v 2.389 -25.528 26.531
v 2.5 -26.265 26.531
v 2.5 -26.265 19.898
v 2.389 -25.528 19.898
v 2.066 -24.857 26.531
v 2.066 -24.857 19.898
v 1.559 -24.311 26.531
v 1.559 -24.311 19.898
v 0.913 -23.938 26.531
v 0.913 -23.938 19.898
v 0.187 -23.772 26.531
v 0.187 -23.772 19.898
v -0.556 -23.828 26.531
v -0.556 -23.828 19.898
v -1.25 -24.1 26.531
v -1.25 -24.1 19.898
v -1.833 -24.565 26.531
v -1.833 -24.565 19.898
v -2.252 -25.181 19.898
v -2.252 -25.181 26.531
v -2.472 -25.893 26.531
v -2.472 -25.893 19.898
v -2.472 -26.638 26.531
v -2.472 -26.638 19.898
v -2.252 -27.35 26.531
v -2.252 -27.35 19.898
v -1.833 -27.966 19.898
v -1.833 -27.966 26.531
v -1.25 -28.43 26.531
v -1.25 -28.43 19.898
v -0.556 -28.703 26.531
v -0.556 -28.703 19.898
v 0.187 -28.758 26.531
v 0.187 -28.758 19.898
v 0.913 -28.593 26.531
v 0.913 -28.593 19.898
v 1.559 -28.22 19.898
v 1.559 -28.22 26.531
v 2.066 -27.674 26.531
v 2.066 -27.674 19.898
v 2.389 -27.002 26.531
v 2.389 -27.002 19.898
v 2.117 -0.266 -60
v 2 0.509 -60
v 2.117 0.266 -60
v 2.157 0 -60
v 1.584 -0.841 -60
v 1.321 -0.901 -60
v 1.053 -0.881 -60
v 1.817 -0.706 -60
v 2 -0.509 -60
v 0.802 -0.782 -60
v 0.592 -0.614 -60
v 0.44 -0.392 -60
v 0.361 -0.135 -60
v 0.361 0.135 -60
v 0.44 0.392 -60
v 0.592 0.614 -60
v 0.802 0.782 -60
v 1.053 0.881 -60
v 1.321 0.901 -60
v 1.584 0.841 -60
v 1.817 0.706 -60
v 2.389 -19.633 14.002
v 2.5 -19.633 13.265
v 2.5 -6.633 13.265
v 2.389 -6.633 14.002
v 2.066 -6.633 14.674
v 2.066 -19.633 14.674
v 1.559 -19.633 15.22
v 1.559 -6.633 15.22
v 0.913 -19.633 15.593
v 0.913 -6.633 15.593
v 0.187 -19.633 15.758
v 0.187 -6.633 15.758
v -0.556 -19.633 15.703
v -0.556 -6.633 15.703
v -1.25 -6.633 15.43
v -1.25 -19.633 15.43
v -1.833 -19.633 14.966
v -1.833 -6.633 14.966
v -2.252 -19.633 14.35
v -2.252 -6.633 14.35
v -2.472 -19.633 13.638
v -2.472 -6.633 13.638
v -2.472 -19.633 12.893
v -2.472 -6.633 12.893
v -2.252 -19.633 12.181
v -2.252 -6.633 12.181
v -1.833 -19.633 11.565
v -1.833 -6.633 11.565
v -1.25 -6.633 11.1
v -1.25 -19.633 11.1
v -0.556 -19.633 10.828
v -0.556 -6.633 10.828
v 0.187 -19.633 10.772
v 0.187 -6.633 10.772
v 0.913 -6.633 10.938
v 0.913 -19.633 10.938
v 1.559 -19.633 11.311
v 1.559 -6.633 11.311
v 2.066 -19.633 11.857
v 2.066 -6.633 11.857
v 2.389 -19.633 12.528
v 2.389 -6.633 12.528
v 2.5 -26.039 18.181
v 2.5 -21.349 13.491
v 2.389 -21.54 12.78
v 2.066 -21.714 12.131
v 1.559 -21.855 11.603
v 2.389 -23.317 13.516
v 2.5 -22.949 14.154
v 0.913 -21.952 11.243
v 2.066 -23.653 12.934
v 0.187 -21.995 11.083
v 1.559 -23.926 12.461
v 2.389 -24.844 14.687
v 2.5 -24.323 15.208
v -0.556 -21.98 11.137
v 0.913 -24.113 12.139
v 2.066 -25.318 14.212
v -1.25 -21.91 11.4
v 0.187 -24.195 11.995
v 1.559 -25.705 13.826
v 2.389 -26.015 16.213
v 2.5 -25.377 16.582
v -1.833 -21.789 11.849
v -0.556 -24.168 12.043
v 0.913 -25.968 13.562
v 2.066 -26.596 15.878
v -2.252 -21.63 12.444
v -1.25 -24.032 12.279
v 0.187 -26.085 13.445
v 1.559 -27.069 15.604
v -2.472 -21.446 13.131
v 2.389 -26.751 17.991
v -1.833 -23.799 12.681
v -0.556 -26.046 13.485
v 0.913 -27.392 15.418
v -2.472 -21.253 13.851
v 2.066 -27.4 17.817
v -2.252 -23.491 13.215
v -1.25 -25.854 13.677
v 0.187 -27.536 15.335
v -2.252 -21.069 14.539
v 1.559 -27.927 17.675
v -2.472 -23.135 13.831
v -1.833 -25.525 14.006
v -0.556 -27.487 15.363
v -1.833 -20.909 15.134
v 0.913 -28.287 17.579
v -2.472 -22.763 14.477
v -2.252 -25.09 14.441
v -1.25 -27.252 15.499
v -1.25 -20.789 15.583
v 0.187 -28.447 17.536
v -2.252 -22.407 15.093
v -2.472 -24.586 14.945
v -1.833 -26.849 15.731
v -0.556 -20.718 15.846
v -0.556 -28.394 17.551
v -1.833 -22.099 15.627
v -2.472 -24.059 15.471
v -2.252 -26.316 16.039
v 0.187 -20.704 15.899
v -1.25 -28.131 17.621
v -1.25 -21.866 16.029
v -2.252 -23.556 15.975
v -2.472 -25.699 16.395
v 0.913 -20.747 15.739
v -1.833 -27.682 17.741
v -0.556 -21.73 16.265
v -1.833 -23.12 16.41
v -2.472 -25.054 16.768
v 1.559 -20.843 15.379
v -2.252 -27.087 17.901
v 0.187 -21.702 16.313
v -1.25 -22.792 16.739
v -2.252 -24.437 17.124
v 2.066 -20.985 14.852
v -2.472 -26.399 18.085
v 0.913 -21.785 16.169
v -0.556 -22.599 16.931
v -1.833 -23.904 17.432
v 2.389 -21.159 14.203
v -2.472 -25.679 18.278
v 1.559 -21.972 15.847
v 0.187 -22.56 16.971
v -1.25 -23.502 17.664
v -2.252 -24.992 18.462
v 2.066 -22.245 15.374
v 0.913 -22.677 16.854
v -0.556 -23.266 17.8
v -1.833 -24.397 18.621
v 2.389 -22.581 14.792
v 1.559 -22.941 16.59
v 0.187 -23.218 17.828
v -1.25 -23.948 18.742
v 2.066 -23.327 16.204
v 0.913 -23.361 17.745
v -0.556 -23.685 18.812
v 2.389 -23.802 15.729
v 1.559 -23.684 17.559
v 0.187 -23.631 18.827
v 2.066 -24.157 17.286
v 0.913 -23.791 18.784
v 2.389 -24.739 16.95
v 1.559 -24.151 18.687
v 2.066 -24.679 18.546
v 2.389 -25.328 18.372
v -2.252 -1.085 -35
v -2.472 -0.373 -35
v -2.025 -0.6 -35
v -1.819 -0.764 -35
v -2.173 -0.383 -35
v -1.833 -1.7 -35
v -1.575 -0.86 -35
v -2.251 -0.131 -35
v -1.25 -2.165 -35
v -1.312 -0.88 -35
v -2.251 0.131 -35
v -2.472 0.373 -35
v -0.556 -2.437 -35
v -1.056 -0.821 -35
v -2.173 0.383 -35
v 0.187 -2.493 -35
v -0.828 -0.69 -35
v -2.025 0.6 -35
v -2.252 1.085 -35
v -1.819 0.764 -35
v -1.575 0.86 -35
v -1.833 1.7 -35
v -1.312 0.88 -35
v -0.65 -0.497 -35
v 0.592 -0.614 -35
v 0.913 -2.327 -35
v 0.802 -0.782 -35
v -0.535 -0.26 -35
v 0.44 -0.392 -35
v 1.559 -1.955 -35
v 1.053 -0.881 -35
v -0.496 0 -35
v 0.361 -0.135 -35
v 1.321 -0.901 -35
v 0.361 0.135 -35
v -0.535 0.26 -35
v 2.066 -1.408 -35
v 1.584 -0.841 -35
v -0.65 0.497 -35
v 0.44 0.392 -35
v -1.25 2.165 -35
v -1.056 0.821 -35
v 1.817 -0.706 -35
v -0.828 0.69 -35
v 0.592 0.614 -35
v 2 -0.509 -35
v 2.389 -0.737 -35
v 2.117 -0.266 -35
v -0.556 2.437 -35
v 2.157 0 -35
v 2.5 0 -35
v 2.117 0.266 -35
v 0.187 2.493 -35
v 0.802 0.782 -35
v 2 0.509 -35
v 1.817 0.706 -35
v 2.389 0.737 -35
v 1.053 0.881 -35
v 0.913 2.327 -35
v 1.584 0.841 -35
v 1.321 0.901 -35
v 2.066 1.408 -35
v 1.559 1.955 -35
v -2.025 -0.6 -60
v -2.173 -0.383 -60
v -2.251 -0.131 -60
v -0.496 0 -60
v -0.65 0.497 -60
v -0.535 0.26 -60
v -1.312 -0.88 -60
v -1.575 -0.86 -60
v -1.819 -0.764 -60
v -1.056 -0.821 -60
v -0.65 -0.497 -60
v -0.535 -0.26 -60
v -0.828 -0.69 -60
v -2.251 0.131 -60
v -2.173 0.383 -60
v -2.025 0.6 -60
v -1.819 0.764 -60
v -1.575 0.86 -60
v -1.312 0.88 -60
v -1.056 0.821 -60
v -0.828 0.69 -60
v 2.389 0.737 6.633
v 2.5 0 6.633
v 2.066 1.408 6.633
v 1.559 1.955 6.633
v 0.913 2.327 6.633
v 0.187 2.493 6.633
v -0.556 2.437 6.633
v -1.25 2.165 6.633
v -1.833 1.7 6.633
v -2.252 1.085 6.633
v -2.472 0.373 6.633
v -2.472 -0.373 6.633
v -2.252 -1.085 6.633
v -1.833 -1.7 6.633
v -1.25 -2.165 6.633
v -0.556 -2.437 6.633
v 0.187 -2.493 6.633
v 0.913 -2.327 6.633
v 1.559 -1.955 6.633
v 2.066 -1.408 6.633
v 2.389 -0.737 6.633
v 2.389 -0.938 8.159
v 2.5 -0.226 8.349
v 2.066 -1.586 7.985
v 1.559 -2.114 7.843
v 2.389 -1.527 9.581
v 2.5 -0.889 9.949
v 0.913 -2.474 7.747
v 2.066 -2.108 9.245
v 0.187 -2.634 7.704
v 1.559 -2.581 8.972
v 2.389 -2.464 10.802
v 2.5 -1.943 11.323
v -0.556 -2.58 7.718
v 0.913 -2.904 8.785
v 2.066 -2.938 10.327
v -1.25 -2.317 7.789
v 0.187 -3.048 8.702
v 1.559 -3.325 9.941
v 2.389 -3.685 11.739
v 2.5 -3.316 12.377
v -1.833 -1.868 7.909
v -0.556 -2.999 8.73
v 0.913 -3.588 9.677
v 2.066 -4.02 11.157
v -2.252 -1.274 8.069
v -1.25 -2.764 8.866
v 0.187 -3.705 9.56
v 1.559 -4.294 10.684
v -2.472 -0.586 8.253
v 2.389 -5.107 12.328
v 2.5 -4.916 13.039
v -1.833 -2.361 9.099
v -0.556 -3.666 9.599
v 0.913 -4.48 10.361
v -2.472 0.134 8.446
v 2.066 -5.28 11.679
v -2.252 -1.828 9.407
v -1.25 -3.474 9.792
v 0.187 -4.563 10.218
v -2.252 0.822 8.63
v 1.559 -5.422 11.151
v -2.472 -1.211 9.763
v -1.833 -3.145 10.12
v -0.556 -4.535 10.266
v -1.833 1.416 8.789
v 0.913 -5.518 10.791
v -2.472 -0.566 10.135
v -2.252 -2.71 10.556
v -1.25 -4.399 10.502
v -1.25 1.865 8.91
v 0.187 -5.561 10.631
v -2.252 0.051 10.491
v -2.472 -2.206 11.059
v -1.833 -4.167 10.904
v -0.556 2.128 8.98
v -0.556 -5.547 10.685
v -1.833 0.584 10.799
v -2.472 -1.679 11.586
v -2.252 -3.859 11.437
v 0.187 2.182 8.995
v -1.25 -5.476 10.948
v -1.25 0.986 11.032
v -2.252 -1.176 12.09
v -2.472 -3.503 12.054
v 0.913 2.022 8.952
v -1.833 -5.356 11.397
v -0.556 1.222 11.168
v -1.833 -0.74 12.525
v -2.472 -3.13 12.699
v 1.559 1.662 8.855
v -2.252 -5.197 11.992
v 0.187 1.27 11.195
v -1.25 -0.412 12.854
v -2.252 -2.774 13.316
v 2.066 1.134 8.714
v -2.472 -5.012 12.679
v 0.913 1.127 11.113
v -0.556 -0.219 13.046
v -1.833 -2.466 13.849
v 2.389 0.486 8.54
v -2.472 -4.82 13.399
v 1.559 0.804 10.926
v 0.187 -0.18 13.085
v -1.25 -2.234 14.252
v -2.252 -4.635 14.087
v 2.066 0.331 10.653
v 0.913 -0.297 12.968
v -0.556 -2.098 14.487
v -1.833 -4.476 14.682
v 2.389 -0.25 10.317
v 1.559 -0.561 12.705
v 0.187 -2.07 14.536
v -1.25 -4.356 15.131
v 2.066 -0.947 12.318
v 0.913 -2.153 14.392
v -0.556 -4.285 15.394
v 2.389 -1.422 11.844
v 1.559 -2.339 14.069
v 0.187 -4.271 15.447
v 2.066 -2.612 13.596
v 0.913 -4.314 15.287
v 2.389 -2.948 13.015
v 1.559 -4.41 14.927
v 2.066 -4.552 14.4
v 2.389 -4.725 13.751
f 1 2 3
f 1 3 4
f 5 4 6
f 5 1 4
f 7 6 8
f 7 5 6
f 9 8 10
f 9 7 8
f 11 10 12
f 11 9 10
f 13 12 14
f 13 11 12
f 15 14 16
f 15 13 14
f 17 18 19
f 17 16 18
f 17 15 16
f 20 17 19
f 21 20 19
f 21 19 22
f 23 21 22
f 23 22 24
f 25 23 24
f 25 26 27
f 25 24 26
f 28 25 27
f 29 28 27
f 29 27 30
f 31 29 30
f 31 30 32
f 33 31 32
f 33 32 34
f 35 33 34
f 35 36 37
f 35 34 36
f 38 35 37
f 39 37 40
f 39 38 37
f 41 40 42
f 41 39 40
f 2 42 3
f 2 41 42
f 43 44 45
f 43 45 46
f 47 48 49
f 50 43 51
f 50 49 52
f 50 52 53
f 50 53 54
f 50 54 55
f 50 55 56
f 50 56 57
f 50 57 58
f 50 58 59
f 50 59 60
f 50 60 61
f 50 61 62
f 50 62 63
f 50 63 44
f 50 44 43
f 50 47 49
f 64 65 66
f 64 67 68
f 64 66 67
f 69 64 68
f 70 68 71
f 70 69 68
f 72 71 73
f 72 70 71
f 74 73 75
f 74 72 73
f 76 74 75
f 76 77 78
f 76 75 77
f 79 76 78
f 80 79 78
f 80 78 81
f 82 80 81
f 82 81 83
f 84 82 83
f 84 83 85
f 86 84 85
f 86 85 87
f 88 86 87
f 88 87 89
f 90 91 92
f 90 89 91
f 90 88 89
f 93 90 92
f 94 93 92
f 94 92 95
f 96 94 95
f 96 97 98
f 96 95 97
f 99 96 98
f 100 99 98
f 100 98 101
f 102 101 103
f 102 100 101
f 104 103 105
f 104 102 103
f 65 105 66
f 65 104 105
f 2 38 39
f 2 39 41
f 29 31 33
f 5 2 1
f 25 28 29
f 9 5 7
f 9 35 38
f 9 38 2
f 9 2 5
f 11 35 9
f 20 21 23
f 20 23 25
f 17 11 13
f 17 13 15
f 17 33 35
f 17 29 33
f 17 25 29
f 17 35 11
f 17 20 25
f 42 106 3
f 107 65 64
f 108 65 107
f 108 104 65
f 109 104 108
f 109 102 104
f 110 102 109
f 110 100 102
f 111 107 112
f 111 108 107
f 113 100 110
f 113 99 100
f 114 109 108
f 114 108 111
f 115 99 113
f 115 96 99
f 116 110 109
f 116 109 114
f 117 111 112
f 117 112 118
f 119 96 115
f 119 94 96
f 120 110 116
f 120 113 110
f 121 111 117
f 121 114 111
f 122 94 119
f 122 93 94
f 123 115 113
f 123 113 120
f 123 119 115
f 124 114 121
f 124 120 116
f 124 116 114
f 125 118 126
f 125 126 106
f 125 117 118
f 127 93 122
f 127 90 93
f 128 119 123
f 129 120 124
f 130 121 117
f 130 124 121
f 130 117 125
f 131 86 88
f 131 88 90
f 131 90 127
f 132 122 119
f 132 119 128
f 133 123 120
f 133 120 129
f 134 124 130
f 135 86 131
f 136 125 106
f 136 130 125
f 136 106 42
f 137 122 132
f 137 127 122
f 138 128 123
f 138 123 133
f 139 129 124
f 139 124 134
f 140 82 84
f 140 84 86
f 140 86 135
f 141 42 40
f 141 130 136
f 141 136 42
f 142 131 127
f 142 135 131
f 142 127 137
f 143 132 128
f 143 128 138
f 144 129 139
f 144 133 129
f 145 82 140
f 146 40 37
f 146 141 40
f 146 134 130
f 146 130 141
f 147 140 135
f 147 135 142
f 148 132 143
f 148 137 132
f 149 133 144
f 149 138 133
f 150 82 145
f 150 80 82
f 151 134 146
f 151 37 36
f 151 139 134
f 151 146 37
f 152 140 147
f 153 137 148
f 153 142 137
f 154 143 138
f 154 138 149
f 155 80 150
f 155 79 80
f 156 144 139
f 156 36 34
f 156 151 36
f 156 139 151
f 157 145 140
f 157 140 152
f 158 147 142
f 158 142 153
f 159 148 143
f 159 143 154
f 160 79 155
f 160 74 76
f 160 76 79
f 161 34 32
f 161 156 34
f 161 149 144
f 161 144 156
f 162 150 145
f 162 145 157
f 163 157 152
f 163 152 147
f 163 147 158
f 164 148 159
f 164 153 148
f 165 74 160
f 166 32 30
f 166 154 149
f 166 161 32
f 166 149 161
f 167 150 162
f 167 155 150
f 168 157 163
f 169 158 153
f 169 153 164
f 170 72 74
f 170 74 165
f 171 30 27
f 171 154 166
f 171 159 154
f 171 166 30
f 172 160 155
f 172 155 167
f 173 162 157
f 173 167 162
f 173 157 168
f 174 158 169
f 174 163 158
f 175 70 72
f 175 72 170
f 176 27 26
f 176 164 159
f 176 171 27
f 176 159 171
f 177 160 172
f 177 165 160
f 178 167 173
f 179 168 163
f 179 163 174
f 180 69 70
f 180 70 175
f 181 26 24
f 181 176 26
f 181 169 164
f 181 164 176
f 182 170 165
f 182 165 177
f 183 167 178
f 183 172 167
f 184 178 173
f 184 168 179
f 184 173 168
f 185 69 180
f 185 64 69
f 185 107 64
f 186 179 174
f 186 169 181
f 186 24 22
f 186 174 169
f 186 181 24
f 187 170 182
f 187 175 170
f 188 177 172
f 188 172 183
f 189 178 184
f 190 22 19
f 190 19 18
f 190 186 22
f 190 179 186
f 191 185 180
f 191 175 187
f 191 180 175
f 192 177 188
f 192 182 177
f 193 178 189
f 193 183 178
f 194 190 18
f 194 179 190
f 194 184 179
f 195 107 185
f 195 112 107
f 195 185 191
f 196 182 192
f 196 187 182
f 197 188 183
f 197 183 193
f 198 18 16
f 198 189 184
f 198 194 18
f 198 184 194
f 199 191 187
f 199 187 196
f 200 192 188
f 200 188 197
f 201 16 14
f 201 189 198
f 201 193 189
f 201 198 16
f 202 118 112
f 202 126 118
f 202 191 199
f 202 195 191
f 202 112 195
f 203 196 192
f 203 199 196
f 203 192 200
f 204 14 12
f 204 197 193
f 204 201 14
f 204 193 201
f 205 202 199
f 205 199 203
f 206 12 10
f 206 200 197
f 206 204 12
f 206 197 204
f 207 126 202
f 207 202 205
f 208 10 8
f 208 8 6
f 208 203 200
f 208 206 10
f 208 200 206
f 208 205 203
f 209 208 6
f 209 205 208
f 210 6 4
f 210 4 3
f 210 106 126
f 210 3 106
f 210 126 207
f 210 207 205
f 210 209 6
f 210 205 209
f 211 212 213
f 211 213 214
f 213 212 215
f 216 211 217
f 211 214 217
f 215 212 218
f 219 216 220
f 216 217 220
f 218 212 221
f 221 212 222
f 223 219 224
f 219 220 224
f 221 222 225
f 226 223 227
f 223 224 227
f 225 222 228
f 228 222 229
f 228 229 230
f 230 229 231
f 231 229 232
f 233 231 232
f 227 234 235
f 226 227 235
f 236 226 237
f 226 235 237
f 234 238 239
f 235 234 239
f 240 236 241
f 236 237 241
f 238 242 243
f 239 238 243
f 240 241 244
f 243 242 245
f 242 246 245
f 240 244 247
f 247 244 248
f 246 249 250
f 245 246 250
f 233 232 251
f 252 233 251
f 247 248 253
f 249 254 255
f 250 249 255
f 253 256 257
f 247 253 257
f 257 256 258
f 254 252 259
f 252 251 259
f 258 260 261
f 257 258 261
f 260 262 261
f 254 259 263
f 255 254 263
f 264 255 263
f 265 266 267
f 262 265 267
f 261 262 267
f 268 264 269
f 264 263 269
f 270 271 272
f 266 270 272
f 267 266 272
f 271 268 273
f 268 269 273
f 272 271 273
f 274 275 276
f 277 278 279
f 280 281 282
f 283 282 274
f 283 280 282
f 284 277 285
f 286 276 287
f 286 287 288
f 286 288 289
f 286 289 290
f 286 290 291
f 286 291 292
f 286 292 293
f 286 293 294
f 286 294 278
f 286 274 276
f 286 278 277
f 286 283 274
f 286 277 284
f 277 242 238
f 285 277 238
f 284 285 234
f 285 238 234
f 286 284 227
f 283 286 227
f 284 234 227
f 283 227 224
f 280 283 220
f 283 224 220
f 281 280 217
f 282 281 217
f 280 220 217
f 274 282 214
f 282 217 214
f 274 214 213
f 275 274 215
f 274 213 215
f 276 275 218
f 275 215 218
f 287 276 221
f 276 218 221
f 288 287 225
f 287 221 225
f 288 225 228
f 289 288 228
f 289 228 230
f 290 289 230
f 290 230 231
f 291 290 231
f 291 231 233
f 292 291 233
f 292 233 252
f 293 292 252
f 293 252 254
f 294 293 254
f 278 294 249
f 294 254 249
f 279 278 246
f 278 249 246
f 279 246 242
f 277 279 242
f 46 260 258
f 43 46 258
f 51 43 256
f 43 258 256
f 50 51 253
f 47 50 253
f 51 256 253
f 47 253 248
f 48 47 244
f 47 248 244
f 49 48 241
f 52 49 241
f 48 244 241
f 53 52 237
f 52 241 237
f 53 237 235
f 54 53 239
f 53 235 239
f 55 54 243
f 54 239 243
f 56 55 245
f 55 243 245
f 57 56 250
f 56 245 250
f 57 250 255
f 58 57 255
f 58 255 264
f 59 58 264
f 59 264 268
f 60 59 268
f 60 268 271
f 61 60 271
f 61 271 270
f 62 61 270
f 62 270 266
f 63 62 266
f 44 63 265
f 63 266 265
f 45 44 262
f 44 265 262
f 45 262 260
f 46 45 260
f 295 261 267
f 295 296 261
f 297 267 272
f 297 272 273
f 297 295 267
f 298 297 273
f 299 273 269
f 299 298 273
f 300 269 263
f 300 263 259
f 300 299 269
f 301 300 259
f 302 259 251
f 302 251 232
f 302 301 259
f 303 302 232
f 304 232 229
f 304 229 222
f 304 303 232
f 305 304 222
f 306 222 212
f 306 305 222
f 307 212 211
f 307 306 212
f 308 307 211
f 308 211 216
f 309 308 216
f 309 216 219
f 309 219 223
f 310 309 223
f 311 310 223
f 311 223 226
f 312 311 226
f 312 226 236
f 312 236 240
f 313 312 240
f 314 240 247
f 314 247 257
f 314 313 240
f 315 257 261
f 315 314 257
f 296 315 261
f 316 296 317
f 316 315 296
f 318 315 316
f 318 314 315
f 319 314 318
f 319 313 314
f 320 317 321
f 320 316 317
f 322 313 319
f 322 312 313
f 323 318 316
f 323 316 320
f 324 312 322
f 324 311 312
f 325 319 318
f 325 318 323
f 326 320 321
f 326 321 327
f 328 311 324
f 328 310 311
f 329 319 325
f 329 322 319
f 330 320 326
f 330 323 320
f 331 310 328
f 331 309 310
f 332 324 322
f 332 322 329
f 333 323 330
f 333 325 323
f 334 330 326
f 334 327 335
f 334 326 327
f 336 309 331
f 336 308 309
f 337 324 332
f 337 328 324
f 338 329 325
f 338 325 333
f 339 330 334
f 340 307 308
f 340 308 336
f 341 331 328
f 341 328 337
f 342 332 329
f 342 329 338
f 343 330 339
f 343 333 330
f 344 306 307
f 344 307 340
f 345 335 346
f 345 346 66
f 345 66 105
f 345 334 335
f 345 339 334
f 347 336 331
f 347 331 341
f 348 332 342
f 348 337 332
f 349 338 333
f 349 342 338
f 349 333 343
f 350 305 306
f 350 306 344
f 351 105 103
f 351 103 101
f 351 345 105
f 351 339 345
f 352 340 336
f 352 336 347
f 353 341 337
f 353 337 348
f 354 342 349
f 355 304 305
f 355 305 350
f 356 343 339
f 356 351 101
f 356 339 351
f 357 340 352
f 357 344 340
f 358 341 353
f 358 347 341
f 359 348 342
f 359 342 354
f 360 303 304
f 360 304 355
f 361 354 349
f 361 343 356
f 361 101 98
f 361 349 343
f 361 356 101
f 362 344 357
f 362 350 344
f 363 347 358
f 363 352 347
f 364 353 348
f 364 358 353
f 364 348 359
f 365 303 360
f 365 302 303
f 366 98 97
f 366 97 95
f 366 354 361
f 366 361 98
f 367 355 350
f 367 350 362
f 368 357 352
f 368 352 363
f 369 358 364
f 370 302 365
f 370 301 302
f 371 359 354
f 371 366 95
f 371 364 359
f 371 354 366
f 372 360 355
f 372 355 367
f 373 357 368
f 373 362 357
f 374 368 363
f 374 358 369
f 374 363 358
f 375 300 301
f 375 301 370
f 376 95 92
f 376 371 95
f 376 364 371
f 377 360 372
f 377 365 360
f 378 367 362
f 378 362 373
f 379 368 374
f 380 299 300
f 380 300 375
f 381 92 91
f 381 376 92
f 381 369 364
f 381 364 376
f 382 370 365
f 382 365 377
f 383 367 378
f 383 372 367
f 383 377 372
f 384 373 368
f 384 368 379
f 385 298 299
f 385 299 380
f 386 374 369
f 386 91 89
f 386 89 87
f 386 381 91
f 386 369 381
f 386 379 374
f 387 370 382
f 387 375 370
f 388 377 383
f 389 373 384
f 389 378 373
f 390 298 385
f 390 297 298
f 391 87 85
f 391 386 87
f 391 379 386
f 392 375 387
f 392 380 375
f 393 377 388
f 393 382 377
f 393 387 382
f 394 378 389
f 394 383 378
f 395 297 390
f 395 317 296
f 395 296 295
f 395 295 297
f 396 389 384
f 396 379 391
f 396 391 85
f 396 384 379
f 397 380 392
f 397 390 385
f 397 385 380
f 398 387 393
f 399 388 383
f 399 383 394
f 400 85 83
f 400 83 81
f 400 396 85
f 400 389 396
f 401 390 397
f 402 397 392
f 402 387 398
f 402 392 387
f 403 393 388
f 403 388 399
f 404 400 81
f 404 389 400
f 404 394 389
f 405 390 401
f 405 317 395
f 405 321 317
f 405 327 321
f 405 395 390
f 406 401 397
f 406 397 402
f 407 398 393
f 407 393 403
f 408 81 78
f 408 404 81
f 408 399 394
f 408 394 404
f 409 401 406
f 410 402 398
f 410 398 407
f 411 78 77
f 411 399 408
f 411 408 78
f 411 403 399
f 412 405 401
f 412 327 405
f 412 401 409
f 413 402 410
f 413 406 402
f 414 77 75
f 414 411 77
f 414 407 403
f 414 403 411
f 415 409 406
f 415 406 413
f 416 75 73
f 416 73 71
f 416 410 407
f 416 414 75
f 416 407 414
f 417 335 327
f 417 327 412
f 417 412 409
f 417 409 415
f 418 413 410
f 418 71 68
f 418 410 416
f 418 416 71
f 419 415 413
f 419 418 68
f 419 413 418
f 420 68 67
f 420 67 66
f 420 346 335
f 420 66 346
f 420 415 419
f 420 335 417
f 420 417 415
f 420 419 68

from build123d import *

# Parameters (mm, degrees)
F1_R     = 2.5
F3_DEPTH = 35
F4_R     = 0.882114
F4_R_2   = 0.903169
F5_DEPTH = 25


with BuildPart() as f2:
    # F2: sweep along a path in F0
    with BuildLine(Plane.YZ) as f2_path:
        Line((0, 0), (0, 6.632662))
        ThreePointArc((0, 6.632662), (-1.942662, 11.322663), (-6.632662, 13.265325))
        Line((-6.632662, 13.265325), (-19.632662, 13.265325))
        ThreePointArc((-19.632662, 13.265325), (-24.322663, 15.207986), (-26.265325, 19.897987))
        Line((-26.265325, 19.897987), (-26.265325, 26.530649))
    # F1 (on Top) → F2 (sweep)
    with BuildSketch(Plane.XY):
        Circle(F1_R)
    sweep(path=f2_path.line)

    # F1 (on Top) → F3 (join)
    with BuildSketch(Plane.XY):
        Circle(F1_R)
    extrude(amount=-F3_DEPTH)

    # F4 (on face) → F5 (join)
    with BuildSketch(Plane(origin=(0, 0, -35), x_dir=(1, 0, 0), z_dir=(0, 0, -1))):
        with Locations((-1.37841, 0)):
            Circle(F4_R)
        with Locations((1.253585, 0)):
            Circle(F4_R_2)
    extrude(amount=F5_DEPTH)


solid = f2.part
